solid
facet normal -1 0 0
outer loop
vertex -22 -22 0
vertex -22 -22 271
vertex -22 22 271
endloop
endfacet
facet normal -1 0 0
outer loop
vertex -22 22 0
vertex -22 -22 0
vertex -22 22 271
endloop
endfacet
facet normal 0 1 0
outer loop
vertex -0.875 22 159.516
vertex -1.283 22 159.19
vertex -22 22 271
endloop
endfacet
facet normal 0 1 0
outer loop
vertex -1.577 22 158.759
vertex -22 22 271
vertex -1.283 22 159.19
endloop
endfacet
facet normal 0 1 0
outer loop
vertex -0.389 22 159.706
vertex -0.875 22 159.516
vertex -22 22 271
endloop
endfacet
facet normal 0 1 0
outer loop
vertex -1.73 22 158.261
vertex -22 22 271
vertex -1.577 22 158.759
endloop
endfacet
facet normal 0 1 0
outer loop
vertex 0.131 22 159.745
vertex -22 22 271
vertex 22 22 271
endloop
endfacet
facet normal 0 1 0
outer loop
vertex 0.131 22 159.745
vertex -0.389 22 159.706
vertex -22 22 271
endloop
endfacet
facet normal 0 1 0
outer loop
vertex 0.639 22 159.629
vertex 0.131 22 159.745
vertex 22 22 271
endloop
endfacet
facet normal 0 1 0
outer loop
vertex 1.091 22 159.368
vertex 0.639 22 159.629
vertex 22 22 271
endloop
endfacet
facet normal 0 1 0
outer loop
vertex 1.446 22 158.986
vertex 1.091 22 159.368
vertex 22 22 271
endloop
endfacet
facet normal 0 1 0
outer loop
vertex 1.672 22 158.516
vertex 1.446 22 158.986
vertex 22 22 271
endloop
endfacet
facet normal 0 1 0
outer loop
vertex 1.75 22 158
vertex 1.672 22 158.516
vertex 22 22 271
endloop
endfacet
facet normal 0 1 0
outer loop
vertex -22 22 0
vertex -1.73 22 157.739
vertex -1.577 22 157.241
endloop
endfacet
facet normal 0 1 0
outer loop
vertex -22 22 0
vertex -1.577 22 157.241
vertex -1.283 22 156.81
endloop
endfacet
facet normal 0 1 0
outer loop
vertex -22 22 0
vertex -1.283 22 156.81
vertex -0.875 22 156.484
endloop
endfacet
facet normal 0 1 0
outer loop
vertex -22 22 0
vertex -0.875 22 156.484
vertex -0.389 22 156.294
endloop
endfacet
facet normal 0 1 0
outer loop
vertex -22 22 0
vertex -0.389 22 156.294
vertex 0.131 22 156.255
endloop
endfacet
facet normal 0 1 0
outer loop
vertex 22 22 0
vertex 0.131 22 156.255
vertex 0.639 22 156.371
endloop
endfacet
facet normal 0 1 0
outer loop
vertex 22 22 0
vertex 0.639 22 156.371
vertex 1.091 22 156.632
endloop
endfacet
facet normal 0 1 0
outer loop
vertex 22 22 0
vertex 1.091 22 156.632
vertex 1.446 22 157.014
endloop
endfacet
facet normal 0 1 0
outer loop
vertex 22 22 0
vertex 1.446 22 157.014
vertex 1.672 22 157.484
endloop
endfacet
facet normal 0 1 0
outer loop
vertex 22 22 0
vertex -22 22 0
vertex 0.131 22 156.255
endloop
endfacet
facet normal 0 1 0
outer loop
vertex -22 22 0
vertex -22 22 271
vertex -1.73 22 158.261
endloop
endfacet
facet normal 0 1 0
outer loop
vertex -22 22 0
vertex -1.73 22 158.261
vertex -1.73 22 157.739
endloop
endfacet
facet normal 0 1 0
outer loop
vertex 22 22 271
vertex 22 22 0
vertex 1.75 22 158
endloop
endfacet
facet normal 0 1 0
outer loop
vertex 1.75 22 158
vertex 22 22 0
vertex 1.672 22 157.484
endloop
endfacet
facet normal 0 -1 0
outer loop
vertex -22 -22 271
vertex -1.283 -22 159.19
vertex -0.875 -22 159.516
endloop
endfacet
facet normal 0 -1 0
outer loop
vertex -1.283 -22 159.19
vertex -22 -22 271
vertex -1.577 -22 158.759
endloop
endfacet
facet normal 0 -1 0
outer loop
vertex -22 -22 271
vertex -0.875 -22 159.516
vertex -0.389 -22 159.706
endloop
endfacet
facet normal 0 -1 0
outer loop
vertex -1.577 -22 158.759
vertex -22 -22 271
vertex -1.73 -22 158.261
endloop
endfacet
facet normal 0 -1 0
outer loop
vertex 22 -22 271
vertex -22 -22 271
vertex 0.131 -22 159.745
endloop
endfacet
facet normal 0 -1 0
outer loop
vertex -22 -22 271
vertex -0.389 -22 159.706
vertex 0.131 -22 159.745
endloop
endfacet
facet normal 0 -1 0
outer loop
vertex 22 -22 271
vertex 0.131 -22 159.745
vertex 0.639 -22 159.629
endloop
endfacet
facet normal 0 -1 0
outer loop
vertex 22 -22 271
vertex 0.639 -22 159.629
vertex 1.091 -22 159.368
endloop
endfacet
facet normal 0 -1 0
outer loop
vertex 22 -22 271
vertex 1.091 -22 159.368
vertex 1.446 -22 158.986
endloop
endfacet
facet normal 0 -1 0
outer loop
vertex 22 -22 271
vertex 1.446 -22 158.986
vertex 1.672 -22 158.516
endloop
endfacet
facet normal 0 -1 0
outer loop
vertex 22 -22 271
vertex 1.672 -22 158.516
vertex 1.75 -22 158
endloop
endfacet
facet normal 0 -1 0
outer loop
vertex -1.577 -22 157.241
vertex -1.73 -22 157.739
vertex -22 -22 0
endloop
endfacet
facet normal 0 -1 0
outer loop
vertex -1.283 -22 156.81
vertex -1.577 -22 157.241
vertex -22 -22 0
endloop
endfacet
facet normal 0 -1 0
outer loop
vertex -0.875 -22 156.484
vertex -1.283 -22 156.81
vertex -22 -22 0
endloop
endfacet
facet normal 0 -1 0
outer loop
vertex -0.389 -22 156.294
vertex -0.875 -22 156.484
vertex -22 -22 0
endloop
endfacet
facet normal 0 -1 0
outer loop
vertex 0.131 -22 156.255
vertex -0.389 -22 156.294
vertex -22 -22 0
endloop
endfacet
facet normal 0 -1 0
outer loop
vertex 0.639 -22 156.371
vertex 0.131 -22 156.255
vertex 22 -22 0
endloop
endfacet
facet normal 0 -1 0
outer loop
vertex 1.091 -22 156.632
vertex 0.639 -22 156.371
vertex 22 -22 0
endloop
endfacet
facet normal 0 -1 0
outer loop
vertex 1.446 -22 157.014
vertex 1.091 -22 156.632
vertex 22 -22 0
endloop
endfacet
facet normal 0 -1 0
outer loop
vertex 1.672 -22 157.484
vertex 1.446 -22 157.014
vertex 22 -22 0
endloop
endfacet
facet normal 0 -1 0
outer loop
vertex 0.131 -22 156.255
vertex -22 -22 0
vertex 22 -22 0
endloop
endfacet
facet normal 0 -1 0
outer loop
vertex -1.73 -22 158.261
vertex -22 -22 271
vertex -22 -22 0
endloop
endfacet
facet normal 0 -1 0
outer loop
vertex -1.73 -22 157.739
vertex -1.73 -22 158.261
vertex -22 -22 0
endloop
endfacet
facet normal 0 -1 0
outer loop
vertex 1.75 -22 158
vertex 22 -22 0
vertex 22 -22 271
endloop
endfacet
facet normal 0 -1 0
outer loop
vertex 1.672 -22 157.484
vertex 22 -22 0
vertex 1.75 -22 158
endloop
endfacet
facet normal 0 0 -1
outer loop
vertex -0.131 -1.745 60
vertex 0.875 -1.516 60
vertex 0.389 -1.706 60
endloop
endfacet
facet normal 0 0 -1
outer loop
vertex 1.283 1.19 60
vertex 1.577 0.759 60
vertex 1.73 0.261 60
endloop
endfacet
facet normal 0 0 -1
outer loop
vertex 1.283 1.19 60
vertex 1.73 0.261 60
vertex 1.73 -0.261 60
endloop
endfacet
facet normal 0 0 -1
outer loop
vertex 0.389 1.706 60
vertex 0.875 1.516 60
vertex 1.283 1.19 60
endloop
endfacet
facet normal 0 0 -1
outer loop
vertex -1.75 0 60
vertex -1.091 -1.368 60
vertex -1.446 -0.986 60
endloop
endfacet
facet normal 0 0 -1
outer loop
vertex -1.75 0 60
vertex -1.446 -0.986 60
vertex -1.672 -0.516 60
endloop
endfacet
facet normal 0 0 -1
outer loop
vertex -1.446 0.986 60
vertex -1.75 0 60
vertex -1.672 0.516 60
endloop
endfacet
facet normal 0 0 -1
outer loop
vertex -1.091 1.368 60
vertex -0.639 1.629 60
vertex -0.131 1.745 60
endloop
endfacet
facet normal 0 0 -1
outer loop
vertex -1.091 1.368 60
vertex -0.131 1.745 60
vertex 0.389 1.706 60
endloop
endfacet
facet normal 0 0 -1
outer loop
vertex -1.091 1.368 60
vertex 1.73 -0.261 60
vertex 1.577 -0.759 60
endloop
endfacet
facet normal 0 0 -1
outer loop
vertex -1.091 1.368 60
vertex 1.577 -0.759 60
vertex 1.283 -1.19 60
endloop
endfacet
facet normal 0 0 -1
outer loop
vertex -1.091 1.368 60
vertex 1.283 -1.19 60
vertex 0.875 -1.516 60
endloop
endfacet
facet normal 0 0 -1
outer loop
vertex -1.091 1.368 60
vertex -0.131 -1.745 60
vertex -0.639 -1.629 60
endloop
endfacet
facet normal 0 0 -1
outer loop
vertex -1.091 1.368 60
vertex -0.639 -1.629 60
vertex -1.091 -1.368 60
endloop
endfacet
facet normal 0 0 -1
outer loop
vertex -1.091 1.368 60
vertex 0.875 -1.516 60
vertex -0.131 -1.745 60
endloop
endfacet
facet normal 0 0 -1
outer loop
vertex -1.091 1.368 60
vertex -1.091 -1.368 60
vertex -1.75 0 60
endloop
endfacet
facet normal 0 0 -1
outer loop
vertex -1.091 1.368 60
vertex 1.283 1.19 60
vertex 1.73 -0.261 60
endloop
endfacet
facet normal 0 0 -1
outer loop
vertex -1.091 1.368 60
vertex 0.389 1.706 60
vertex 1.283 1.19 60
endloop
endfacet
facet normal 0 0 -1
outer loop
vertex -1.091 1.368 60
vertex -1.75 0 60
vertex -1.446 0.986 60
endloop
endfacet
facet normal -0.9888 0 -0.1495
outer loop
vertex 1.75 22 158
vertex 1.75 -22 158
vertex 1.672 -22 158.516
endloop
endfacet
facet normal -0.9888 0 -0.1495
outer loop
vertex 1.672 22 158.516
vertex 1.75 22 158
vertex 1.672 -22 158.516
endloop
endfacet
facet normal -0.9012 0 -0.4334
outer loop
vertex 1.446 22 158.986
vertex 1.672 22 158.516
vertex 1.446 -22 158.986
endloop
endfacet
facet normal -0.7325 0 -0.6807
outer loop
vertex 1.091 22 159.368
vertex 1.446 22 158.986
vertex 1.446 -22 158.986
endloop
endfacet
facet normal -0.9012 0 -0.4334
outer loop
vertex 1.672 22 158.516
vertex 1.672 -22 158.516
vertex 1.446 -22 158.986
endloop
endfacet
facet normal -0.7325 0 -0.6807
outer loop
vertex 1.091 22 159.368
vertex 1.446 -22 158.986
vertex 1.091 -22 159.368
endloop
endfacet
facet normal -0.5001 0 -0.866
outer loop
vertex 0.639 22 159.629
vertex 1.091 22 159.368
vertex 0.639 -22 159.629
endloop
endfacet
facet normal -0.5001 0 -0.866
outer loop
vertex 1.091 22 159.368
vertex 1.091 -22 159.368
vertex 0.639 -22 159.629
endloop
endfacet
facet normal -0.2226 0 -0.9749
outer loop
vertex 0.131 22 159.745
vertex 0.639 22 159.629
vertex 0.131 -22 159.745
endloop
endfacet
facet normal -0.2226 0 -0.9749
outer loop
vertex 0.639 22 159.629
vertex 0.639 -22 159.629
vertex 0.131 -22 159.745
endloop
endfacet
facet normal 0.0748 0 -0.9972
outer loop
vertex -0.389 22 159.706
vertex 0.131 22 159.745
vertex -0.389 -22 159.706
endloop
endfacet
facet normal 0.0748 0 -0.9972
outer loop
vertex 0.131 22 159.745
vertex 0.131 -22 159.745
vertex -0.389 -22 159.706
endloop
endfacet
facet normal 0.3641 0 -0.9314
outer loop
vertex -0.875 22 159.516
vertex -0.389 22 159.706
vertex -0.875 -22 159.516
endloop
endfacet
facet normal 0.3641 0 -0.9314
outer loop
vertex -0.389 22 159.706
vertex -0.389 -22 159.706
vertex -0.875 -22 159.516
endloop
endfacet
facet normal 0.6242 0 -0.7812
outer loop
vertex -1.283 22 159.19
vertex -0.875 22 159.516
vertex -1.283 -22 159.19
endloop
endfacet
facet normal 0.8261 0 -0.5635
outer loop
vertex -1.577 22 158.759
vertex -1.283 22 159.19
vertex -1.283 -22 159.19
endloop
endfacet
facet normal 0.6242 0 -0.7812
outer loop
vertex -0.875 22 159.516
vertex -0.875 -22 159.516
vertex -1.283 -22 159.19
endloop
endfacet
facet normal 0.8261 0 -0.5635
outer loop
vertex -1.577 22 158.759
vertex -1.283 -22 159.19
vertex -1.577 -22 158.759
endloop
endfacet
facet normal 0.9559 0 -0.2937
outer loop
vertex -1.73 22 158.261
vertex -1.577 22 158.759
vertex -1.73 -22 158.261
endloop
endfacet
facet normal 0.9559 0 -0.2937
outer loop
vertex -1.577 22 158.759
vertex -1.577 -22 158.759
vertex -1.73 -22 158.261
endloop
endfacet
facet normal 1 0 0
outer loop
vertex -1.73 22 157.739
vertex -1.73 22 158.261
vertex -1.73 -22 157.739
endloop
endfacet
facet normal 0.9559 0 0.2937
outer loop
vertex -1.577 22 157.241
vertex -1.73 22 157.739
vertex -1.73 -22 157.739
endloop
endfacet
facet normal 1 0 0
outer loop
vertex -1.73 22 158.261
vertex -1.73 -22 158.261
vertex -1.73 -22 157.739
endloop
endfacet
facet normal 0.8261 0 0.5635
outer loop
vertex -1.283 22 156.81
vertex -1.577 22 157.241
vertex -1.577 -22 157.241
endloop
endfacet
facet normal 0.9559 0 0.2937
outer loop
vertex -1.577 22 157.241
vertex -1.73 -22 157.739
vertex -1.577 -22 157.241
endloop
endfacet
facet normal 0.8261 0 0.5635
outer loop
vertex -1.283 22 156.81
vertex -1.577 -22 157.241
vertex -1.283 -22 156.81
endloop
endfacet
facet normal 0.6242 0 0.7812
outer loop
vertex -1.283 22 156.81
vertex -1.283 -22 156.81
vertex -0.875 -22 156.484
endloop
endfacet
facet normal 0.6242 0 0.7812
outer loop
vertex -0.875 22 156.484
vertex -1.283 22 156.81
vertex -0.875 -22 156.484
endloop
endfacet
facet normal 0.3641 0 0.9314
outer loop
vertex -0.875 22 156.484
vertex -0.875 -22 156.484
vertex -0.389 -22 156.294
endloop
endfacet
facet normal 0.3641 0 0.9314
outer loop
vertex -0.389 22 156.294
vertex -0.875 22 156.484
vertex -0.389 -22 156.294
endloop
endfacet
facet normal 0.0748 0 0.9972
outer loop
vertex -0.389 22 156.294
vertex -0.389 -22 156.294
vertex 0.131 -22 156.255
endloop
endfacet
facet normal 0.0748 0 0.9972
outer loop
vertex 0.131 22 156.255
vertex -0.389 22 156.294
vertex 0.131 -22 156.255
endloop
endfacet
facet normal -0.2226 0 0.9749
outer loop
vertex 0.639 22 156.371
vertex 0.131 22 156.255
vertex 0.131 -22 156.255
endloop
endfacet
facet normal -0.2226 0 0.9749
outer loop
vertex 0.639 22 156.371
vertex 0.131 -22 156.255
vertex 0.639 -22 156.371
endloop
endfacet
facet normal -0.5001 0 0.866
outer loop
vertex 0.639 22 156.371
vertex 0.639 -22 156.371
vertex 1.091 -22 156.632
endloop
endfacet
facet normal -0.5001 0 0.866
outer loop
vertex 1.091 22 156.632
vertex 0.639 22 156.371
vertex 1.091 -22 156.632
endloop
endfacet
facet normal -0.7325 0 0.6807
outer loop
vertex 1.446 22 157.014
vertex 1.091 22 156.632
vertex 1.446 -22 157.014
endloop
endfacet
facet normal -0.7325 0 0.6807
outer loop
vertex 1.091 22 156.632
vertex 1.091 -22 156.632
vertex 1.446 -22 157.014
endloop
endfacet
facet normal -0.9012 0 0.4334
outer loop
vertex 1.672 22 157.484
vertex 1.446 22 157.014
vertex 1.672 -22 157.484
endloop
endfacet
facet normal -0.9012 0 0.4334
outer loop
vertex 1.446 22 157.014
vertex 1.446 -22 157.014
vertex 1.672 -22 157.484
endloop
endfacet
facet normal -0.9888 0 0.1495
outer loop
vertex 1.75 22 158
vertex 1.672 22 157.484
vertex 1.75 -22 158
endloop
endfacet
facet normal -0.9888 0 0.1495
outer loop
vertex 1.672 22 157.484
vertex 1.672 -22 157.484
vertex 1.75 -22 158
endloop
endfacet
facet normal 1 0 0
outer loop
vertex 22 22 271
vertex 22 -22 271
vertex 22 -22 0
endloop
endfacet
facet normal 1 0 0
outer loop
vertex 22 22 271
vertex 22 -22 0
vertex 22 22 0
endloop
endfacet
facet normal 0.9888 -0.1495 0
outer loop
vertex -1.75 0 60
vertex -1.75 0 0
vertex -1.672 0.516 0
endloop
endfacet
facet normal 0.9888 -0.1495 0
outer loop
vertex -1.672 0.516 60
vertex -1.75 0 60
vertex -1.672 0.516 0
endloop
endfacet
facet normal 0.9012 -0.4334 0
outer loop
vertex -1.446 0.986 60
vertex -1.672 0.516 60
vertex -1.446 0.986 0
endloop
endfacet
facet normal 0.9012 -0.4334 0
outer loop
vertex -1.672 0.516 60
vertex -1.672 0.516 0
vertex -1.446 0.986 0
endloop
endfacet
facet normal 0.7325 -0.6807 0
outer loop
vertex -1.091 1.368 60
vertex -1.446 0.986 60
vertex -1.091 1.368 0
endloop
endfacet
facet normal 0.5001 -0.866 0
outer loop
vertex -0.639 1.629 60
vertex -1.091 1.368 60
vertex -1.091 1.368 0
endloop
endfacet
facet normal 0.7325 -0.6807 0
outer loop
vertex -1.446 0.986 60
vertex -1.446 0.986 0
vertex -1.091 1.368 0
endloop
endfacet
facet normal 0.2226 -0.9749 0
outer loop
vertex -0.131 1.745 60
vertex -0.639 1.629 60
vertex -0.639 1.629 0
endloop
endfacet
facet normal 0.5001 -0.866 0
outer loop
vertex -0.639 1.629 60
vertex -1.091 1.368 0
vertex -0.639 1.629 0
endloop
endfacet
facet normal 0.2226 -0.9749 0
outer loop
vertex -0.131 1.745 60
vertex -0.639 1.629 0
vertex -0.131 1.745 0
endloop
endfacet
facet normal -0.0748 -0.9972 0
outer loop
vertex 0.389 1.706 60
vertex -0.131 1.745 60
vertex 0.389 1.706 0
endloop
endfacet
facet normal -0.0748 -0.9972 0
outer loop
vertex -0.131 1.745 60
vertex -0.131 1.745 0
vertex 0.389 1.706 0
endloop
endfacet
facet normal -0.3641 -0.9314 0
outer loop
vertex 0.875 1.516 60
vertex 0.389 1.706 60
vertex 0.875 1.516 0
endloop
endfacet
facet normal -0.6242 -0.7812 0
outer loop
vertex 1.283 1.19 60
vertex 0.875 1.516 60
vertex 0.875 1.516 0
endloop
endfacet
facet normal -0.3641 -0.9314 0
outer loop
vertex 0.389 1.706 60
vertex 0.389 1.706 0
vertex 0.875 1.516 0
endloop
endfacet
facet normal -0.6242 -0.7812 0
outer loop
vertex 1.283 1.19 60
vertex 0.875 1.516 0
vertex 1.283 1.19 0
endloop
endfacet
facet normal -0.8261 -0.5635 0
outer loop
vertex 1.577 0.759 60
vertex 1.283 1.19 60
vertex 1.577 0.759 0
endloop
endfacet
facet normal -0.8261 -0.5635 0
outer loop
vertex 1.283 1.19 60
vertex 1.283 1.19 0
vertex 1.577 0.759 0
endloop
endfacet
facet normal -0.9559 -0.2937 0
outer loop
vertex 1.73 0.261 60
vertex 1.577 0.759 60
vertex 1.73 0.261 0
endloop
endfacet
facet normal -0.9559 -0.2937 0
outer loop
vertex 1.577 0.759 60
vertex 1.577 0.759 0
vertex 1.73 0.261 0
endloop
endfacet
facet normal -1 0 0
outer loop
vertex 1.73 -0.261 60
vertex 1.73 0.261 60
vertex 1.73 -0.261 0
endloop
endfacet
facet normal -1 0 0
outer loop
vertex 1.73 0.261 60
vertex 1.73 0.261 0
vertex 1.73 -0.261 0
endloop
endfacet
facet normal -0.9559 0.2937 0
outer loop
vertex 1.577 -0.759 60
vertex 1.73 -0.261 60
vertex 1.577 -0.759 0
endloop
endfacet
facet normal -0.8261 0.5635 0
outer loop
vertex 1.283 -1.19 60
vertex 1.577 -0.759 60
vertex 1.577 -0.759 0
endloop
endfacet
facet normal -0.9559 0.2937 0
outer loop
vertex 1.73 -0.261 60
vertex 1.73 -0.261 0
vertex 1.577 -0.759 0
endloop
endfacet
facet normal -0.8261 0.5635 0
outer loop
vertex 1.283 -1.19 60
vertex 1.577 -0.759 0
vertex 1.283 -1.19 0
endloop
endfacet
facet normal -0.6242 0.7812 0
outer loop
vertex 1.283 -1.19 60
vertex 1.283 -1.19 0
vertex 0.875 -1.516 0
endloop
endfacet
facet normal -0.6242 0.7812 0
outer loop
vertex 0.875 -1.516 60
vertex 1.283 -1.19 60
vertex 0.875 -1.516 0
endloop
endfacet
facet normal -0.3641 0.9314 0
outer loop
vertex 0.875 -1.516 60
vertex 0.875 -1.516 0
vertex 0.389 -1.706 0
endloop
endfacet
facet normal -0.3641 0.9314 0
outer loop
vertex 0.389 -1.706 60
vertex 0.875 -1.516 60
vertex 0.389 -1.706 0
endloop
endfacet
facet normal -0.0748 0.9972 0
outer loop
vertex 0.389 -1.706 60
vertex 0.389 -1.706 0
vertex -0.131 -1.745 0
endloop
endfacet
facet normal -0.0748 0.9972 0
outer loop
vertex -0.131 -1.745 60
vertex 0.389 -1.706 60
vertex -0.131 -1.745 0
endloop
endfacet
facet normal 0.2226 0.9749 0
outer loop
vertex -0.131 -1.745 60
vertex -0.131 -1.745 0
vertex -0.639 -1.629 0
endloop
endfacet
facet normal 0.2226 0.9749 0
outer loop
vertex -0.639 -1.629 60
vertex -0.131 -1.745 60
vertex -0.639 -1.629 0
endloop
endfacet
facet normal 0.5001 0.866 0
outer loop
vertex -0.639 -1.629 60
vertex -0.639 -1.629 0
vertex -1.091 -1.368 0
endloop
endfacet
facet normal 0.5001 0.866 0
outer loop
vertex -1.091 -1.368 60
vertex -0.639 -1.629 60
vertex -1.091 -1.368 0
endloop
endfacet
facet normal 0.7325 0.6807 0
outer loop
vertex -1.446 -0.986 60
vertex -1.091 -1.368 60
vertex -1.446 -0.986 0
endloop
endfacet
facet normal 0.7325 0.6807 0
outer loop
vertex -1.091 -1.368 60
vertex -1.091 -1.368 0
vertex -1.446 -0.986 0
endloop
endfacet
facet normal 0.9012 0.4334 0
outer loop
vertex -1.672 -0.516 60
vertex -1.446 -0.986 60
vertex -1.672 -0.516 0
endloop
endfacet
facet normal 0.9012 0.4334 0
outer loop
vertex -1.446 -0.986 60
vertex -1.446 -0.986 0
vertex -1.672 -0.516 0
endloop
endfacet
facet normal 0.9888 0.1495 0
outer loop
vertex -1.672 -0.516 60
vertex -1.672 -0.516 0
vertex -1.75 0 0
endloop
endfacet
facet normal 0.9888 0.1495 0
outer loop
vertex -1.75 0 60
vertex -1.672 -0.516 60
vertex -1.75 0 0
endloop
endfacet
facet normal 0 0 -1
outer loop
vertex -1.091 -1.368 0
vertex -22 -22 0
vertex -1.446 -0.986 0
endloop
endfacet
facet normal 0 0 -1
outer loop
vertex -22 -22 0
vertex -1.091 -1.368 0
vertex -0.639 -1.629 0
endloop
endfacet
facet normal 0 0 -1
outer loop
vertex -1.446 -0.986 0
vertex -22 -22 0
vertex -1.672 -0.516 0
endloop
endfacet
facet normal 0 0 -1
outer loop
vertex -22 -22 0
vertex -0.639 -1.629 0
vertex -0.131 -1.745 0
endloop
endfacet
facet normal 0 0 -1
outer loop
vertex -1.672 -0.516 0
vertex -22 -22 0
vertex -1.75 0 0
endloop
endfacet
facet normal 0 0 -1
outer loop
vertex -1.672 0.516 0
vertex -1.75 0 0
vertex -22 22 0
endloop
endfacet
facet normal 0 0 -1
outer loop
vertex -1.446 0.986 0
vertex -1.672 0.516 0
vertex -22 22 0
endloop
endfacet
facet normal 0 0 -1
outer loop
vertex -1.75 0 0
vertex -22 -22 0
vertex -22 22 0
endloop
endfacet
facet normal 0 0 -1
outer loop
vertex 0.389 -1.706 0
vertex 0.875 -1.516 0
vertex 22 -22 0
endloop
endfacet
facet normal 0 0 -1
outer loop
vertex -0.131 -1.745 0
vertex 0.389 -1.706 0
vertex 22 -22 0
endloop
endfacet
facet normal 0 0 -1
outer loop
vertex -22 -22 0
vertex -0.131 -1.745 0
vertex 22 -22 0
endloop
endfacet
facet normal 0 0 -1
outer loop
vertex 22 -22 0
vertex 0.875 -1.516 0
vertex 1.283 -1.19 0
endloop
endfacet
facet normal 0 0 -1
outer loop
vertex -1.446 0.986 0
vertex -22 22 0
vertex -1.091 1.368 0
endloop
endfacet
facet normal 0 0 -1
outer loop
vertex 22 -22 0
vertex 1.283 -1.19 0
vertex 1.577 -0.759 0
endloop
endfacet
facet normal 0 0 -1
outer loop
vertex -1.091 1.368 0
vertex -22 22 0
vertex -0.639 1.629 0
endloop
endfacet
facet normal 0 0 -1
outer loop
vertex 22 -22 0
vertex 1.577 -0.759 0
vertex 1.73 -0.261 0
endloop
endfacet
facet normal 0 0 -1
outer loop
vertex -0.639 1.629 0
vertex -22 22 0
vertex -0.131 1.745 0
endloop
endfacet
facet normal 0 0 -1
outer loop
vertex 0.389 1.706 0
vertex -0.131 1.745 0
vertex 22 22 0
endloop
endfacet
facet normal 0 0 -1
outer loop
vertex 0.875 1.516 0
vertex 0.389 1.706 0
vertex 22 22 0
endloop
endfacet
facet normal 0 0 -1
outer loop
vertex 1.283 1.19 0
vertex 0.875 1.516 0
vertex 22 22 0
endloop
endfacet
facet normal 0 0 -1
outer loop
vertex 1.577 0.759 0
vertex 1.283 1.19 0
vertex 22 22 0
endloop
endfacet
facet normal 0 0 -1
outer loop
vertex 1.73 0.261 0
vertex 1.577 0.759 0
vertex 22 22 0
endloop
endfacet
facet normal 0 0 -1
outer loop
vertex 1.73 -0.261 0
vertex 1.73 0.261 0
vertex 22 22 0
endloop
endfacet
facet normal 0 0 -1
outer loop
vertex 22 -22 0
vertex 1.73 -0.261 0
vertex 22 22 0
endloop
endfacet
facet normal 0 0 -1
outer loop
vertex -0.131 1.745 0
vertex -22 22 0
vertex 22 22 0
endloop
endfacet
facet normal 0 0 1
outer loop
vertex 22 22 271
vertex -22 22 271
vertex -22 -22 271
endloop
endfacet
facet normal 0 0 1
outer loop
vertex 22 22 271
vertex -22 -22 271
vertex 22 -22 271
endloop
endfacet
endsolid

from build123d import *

# Parameters (mm, degrees)
ESQUISSE1_W             = 44
ESQUISSE1_H             = 44
BOSS_EXTRU_1_DEPTH      = 271
ESQUISSE2_R             = 1.75
ENL_V_MAT_EXTRU_1_DEPTH = 44
ESQUISSE3_R             = 1.75
ENL_V_MAT_EXTRU_2_DEPTH = 60


with BuildPart() as part:
    # Esquisse1 → Boss.-Extru.1 (new body)
    with BuildSketch(Plane.XY):
        Rectangle(ESQUISSE1_W, ESQUISSE1_H)
    extrude(amount=BOSS_EXTRU_1_DEPTH)

    # Esquisse2 → Enlèv. mat.-Extru.1 (cut)
    with BuildSketch(Plane.XZ.offset(22)):
        with Locations((0, 158)):
            Circle(ESQUISSE2_R)
    extrude(amount=-ENL_V_MAT_EXTRU_1_DEPTH, mode=Mode.SUBTRACT)

    # Esquisse3 → Enlèv. mat.-Extru.2 (cut)
    with BuildSketch(Plane(origin=(0, 0, 0), x_dir=(-1, 0, 0), z_dir=(0, 0, -1))):
        Circle(ESQUISSE3_R)
    extrude(amount=-ENL_V_MAT_EXTRU_2_DEPTH, mode=Mode.SUBTRACT)


solid = part.part
